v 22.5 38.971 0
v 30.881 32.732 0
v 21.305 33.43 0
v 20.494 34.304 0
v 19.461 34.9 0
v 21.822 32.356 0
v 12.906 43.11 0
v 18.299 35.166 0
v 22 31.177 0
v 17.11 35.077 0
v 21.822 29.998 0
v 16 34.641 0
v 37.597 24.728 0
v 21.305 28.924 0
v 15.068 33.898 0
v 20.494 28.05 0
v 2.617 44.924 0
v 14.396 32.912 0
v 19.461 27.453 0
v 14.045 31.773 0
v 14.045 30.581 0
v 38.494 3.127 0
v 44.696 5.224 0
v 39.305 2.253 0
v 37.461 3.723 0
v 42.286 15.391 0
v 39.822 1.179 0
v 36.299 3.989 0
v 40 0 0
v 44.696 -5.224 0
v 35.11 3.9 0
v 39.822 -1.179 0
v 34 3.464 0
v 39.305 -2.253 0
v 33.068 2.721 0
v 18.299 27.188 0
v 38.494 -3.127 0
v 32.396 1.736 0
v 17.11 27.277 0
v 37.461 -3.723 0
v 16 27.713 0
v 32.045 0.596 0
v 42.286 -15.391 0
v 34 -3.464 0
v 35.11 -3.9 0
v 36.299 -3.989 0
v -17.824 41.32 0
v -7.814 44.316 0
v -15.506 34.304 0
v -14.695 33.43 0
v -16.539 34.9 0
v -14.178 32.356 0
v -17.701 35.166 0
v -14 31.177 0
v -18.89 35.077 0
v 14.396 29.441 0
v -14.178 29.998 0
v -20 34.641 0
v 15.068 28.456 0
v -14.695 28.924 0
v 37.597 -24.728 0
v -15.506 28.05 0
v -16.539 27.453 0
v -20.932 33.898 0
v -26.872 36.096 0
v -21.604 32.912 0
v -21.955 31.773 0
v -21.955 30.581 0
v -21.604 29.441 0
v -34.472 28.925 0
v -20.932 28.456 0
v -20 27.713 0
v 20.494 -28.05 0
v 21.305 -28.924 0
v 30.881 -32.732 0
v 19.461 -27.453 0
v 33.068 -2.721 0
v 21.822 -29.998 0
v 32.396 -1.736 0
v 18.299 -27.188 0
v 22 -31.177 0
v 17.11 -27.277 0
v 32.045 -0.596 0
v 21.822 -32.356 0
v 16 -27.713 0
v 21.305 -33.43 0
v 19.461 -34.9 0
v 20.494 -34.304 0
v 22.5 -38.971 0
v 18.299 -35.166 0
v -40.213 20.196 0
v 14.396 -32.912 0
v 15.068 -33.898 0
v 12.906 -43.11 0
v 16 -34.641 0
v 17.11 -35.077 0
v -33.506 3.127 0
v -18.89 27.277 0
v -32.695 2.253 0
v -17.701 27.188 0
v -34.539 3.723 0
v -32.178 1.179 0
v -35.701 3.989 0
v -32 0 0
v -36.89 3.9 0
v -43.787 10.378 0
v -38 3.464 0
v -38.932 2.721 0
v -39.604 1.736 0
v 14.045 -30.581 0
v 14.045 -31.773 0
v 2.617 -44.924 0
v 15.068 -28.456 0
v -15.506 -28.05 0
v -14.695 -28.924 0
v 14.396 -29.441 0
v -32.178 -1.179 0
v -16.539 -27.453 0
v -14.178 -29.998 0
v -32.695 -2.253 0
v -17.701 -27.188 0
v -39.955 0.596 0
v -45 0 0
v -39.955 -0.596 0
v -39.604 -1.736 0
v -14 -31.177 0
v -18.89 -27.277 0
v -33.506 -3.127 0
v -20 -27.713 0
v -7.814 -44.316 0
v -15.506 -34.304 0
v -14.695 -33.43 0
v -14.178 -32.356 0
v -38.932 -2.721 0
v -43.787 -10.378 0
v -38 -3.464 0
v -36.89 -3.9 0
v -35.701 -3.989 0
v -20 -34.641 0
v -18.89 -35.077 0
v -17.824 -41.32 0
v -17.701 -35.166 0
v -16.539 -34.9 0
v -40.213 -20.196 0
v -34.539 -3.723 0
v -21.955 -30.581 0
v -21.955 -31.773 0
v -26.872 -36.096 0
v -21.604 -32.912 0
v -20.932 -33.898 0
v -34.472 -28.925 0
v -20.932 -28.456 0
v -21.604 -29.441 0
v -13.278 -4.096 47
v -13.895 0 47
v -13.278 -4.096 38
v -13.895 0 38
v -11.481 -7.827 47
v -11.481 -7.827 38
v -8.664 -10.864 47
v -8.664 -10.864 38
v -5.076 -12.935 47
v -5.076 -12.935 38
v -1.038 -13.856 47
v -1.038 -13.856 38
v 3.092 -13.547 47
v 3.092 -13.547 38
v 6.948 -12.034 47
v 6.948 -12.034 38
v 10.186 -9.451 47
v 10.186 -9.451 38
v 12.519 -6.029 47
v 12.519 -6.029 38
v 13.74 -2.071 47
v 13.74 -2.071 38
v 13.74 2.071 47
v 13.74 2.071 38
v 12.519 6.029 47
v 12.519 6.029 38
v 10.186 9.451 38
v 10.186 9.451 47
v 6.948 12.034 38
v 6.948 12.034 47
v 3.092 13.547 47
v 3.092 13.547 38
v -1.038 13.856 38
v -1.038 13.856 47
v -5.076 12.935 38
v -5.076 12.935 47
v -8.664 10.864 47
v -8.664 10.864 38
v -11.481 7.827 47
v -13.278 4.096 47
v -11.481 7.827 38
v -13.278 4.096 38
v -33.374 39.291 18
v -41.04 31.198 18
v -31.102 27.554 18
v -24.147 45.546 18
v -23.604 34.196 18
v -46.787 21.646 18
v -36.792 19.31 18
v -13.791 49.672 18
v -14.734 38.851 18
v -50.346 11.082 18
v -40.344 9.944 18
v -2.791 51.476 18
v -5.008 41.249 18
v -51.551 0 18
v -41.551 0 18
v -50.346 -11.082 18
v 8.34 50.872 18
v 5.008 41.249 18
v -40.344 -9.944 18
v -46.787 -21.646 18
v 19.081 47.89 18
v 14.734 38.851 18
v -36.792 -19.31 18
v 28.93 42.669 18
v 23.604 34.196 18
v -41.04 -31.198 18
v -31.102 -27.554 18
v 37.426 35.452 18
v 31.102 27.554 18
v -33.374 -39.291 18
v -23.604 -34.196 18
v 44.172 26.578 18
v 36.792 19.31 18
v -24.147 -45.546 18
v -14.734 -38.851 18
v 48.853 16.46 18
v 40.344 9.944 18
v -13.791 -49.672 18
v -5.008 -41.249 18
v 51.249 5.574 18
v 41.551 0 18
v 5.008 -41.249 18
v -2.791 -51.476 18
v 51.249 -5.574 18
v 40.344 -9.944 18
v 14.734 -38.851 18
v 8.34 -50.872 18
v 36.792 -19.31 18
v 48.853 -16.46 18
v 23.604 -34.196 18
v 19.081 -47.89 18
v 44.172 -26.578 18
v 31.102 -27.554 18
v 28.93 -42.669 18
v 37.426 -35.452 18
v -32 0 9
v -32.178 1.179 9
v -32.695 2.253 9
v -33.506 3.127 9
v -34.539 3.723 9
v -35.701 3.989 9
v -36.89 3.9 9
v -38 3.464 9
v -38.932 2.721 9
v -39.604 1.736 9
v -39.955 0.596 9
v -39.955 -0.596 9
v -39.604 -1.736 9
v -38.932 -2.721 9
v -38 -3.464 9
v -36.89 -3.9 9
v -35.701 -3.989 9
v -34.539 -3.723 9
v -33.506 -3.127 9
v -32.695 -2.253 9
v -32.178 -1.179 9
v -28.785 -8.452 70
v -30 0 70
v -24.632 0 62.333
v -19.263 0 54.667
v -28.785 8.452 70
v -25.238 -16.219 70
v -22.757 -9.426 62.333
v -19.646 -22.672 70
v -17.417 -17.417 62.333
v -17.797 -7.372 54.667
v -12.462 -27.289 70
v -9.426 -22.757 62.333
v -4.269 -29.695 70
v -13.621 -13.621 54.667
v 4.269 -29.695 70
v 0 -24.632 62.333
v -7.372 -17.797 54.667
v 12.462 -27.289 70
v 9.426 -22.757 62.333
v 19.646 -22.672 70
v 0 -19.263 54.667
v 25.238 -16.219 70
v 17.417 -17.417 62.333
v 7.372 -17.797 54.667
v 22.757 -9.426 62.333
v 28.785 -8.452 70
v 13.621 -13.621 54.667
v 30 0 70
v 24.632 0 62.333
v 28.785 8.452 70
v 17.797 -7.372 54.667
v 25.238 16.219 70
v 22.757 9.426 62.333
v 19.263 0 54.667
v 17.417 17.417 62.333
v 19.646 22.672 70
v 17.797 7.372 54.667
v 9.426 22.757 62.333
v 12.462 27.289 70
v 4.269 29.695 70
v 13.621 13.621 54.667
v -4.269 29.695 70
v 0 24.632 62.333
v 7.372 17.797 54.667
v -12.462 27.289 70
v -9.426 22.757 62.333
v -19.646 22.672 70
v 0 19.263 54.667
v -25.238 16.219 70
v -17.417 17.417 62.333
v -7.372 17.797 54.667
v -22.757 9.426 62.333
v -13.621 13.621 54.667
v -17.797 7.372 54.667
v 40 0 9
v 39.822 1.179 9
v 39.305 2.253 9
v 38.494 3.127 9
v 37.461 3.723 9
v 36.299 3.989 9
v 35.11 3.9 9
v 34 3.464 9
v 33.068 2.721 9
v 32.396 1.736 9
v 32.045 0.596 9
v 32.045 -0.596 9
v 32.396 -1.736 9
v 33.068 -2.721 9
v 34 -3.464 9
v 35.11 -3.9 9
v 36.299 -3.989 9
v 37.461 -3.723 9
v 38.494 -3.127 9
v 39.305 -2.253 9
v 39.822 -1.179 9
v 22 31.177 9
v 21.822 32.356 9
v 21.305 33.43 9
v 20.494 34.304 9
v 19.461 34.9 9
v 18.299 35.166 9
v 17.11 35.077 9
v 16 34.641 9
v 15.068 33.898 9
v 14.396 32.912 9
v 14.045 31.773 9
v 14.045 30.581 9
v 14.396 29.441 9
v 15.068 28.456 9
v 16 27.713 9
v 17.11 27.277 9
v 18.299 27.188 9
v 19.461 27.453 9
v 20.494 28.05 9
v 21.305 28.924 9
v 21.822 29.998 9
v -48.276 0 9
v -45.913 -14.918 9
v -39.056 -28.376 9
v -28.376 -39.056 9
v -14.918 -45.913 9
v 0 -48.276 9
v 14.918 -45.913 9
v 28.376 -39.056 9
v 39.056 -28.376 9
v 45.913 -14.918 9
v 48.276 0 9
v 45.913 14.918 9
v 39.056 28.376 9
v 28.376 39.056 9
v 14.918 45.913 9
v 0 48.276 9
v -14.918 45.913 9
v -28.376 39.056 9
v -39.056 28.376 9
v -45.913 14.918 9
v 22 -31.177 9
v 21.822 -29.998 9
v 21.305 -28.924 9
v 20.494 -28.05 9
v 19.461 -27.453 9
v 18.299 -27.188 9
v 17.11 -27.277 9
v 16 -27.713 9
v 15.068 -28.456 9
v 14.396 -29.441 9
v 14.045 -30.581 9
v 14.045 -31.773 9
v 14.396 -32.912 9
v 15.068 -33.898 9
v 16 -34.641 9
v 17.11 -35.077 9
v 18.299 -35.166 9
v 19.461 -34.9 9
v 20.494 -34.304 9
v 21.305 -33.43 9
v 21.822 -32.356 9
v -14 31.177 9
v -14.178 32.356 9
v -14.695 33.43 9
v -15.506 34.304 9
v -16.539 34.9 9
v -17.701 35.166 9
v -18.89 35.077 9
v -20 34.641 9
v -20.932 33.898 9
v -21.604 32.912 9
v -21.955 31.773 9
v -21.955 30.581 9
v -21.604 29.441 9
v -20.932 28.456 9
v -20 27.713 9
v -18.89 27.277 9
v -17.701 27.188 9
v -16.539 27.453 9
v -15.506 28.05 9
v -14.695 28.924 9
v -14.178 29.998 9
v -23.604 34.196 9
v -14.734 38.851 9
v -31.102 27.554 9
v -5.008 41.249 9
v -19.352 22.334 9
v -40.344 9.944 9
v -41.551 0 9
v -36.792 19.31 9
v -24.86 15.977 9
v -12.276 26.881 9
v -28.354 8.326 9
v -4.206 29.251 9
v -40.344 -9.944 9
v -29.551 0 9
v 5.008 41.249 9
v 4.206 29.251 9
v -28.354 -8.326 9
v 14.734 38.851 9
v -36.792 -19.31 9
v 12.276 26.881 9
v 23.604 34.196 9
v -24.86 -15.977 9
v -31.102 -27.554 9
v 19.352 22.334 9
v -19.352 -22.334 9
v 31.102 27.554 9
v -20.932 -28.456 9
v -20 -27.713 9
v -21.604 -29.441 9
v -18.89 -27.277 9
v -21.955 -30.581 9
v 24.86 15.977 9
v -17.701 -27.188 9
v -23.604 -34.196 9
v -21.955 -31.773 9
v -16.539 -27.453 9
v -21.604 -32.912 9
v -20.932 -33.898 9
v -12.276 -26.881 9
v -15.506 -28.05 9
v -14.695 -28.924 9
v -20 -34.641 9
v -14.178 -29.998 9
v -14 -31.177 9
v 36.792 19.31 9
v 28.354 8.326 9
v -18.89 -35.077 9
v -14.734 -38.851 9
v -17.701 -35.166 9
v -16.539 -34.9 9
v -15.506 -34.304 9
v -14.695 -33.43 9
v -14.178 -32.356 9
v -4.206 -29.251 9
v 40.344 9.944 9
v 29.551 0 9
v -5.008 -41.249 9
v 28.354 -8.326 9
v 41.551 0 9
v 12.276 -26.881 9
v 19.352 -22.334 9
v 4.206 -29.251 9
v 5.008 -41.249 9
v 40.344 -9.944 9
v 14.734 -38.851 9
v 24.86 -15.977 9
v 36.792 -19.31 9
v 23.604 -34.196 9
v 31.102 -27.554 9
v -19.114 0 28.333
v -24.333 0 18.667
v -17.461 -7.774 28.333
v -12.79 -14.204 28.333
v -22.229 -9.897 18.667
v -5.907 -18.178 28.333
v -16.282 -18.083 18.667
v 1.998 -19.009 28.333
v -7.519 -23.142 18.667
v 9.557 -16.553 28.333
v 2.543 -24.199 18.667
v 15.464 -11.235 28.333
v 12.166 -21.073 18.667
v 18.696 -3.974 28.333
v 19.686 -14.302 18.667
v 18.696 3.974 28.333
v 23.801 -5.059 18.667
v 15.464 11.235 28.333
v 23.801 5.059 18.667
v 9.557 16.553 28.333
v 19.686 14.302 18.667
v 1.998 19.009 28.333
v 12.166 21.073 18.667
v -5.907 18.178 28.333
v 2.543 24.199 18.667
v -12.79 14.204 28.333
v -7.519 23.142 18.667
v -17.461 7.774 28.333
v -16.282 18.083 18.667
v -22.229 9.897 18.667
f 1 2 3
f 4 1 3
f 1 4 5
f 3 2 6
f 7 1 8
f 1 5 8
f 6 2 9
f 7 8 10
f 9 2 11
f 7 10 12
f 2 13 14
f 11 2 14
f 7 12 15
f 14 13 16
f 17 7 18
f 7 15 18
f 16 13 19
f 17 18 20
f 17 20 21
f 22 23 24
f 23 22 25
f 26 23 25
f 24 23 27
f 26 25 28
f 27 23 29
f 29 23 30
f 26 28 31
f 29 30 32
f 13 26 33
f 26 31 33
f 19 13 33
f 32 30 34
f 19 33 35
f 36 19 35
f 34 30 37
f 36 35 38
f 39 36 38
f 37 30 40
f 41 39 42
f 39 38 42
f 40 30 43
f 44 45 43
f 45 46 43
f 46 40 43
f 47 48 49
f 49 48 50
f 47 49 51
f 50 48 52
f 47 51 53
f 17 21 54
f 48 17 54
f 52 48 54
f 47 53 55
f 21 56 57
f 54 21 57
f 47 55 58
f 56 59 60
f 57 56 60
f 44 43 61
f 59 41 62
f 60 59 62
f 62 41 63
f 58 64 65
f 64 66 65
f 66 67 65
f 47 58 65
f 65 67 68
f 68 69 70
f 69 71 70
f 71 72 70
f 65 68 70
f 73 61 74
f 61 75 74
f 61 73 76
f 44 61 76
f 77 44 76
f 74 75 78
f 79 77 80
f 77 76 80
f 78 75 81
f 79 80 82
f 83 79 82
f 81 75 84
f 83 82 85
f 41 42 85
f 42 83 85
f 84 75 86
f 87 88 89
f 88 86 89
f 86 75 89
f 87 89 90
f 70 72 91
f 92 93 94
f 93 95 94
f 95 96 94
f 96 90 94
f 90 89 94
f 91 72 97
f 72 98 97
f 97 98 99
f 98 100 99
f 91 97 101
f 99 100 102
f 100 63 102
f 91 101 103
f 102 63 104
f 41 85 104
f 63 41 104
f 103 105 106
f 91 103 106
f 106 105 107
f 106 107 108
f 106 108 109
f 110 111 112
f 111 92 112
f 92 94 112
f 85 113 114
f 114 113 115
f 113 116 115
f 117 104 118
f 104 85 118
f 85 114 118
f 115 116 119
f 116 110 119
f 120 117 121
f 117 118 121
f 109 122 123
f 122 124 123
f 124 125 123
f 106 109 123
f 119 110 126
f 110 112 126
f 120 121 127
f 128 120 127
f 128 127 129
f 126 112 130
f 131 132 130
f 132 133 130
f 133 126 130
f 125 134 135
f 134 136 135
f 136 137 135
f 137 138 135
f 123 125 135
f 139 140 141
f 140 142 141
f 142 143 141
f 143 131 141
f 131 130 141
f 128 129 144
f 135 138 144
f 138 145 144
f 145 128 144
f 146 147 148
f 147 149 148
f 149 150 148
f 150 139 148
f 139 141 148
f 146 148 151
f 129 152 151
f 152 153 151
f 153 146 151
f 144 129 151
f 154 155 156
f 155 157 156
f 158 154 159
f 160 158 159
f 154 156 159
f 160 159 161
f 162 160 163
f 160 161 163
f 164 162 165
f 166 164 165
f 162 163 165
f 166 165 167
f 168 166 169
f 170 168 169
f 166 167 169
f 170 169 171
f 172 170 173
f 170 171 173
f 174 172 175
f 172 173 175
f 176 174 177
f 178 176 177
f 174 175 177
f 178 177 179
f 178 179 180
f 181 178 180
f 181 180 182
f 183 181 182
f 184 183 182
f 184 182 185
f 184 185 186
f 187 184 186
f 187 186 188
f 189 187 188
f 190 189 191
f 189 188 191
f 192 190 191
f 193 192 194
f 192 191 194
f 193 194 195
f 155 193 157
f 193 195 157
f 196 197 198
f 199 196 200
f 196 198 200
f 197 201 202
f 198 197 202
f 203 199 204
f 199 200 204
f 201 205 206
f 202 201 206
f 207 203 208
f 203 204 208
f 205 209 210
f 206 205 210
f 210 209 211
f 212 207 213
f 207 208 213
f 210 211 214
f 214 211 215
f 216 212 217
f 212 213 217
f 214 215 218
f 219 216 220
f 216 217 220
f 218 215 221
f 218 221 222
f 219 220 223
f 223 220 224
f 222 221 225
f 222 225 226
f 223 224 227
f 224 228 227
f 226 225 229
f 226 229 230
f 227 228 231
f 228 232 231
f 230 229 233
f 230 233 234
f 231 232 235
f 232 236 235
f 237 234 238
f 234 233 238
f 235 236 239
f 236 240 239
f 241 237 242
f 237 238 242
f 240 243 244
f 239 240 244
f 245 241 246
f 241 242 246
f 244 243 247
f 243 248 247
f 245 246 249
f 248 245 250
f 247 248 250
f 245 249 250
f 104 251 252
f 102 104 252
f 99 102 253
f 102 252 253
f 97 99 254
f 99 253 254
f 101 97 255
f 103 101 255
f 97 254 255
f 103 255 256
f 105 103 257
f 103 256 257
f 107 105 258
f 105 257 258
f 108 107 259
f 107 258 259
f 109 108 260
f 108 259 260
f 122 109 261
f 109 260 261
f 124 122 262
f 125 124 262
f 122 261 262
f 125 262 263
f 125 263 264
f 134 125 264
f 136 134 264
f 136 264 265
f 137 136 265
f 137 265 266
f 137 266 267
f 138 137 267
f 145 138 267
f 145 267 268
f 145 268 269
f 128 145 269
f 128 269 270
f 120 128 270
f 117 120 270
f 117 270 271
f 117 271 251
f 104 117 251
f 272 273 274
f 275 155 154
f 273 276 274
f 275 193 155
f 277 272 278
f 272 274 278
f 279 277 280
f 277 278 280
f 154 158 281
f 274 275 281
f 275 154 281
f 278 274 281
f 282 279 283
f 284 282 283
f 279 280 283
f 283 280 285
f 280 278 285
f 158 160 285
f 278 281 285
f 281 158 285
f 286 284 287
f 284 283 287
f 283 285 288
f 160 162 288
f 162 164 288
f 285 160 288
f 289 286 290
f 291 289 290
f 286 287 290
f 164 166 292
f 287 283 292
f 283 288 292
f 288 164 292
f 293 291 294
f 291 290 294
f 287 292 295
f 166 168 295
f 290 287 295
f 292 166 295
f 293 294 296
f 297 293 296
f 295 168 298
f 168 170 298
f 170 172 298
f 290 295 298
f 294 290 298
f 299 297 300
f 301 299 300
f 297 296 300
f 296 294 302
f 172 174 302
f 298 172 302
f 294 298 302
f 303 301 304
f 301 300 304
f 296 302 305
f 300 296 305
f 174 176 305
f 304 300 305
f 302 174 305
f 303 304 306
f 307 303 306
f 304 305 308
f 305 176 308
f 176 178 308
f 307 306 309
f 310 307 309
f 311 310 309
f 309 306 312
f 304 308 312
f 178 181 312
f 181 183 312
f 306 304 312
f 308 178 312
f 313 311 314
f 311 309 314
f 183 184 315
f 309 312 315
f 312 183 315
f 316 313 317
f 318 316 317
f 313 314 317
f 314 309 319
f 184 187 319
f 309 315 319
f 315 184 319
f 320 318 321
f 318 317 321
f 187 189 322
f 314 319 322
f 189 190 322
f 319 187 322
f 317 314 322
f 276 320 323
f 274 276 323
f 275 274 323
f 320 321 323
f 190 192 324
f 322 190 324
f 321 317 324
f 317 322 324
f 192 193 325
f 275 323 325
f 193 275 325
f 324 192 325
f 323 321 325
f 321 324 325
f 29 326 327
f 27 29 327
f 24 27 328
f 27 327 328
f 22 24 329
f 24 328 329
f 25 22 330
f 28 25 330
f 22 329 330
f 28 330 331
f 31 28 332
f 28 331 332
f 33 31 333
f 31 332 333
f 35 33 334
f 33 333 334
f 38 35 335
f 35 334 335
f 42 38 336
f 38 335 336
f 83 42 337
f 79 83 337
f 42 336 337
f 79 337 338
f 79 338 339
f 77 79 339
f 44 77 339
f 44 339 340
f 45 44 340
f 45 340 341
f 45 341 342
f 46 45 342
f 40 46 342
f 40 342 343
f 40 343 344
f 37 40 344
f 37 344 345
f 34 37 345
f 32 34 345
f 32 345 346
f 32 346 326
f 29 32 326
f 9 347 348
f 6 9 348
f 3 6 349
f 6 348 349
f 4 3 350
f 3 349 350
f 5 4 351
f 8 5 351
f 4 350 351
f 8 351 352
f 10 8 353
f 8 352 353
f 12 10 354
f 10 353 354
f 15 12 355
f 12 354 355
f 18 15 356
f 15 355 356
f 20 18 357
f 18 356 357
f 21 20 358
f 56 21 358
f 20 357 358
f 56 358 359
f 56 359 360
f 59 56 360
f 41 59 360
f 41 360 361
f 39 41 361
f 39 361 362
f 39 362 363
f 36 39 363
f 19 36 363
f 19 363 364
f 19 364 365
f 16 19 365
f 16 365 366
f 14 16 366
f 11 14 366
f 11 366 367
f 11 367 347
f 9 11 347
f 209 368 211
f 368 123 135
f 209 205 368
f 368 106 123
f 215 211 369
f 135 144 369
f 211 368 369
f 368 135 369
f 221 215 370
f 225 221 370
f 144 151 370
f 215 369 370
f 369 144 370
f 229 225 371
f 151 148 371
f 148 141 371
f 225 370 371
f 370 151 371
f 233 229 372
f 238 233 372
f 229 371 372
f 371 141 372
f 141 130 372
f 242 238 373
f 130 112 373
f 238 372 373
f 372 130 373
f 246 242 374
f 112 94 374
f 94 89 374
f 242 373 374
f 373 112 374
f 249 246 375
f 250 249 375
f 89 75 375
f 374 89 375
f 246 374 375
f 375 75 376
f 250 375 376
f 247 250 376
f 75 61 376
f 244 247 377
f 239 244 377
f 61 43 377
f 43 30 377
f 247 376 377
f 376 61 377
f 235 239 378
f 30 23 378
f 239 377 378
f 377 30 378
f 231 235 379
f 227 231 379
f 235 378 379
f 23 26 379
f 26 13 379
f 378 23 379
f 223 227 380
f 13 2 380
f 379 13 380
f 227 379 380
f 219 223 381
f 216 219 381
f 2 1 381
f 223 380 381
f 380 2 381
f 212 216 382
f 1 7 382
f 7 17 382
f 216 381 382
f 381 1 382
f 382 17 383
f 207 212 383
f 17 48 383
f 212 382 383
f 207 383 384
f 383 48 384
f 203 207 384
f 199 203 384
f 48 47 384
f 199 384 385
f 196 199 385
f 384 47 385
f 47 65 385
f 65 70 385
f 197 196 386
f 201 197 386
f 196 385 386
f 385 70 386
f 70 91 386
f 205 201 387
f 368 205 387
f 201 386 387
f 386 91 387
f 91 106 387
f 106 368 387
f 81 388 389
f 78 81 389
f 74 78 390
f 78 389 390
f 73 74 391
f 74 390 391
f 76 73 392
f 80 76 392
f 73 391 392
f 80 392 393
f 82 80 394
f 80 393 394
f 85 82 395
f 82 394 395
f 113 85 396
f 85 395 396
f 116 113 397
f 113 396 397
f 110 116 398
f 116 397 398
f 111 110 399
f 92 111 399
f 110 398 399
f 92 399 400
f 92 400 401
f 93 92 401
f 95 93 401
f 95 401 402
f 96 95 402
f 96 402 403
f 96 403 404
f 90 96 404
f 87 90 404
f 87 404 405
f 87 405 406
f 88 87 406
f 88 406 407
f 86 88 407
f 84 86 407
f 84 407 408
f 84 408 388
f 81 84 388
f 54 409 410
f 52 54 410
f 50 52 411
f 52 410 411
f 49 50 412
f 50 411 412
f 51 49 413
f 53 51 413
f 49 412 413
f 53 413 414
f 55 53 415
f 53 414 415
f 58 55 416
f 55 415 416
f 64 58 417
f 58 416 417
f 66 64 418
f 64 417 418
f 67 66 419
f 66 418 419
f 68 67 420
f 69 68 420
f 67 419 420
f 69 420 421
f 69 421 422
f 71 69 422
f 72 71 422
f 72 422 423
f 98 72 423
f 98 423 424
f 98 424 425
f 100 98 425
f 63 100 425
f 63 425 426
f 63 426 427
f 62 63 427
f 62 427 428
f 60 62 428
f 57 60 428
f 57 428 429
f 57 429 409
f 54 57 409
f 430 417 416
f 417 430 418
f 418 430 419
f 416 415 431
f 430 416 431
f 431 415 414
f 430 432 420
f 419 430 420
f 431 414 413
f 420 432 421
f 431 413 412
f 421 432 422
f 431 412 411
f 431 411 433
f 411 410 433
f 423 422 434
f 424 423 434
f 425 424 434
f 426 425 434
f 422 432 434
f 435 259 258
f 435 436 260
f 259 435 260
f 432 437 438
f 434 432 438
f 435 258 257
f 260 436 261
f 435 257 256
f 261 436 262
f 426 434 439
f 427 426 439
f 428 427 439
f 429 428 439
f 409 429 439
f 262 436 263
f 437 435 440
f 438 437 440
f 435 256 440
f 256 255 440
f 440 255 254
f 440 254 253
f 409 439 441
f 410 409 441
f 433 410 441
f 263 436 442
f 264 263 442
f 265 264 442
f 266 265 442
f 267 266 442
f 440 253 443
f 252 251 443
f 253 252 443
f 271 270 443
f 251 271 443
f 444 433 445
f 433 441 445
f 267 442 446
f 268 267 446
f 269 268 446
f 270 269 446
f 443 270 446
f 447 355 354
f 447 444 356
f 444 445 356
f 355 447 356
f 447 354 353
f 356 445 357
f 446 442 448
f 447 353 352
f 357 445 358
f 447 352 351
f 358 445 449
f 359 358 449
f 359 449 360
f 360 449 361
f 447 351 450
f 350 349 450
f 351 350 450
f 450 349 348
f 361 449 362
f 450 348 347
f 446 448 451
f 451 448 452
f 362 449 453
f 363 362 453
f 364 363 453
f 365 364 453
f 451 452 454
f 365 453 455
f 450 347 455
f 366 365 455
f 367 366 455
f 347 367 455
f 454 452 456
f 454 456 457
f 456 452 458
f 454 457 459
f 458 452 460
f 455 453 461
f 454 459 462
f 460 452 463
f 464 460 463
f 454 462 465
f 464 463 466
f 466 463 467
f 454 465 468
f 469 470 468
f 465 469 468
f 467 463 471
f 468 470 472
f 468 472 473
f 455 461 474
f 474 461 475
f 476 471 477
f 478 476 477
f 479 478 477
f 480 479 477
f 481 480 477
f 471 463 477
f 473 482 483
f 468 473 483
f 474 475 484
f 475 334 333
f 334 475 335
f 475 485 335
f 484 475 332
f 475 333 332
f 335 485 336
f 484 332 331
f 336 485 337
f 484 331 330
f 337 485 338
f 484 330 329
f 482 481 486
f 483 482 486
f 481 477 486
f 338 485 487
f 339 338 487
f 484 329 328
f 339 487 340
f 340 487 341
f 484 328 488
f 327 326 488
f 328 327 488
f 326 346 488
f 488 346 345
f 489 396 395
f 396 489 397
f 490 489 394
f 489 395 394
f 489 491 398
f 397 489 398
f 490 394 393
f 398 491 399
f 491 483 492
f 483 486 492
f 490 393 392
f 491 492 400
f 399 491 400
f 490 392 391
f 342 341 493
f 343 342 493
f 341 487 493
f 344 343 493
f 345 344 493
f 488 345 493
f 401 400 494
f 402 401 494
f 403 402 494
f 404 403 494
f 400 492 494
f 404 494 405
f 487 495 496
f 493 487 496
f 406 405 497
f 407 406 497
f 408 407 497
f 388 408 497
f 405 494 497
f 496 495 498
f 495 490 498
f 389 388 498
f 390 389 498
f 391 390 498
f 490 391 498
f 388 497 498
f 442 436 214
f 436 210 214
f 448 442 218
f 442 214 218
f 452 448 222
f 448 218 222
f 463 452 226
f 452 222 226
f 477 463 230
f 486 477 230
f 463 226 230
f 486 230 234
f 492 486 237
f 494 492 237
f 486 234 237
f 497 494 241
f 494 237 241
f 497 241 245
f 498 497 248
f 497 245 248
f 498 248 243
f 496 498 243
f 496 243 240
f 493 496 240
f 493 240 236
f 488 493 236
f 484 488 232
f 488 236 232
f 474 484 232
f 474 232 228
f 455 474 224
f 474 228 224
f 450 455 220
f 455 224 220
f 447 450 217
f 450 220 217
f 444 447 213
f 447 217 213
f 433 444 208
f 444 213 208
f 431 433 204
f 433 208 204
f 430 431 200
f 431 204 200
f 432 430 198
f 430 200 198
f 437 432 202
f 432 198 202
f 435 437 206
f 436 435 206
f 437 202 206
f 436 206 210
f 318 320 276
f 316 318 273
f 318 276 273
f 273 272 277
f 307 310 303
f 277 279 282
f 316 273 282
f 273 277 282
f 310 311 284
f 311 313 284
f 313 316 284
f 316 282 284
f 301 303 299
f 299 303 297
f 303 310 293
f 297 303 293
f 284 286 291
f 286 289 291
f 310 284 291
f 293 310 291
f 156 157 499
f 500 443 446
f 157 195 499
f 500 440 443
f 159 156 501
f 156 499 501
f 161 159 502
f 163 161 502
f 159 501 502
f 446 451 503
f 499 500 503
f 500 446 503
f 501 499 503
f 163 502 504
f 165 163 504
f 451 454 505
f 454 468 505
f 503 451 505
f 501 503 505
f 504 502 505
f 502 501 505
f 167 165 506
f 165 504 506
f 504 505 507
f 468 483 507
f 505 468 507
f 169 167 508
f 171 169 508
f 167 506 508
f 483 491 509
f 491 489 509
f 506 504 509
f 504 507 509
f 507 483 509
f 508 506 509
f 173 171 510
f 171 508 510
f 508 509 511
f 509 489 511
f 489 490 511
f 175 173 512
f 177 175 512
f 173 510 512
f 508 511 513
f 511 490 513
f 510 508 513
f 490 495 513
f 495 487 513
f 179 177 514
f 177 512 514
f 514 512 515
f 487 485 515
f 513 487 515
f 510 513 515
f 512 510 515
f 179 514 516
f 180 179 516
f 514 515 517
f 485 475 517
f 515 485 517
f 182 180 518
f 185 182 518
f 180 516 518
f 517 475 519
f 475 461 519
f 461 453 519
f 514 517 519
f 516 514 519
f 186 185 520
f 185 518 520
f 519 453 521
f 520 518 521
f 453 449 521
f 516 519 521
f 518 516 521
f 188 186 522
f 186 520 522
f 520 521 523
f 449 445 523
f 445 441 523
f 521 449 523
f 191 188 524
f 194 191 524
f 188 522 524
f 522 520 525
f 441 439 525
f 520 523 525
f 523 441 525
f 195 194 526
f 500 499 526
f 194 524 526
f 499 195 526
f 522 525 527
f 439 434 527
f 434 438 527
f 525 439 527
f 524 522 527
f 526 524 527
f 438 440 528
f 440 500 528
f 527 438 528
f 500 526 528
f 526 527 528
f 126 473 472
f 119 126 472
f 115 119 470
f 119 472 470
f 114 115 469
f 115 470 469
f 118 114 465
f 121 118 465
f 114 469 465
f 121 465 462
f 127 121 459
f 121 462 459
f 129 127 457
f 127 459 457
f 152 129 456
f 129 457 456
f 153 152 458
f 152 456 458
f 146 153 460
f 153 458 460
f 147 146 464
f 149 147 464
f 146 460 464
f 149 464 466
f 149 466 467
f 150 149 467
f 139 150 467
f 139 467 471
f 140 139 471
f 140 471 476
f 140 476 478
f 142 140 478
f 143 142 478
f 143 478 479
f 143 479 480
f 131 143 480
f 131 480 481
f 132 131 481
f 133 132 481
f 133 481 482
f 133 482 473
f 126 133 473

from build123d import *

# Parameters (mm, degrees)
F2_R     = 4
F3_DEPTH = 25


with BuildPart() as f1:
    # F0 (on Front) → F1 (revolve)
    with BuildSketch(Plane.XZ):
        Polygon((0, 0), (0, 70), (-30, 70), (-13.895227, 47), (-13.895227, 38), (-29.551464, 9), (-41.551464, 9), (-41.551464, 18), (-51.551464, 18), (-45, 0), align=None)
    revolve(axis=Axis((0, 0, 35), (0, 0, 1)))

    # F2 (on face) → F3 (cut)
    with BuildSketch(Plane.XY.offset(9)):
        with Locations((-36, 0)):
            Circle(F2_R)
        with Locations((-18, -31.176915)):
            Circle(F2_R)
        with Locations((18, -31.176915)):
            Circle(F2_R)
        with Locations((36, 0)):
            Circle(F2_R)
        with Locations((18, 31.176915)):
            Circle(F2_R)
        with Locations((-18, 31.176915)):
            Circle(F2_R)
    extrude(amount=-F3_DEPTH, mode=Mode.SUBTRACT)


solid = f1.part
